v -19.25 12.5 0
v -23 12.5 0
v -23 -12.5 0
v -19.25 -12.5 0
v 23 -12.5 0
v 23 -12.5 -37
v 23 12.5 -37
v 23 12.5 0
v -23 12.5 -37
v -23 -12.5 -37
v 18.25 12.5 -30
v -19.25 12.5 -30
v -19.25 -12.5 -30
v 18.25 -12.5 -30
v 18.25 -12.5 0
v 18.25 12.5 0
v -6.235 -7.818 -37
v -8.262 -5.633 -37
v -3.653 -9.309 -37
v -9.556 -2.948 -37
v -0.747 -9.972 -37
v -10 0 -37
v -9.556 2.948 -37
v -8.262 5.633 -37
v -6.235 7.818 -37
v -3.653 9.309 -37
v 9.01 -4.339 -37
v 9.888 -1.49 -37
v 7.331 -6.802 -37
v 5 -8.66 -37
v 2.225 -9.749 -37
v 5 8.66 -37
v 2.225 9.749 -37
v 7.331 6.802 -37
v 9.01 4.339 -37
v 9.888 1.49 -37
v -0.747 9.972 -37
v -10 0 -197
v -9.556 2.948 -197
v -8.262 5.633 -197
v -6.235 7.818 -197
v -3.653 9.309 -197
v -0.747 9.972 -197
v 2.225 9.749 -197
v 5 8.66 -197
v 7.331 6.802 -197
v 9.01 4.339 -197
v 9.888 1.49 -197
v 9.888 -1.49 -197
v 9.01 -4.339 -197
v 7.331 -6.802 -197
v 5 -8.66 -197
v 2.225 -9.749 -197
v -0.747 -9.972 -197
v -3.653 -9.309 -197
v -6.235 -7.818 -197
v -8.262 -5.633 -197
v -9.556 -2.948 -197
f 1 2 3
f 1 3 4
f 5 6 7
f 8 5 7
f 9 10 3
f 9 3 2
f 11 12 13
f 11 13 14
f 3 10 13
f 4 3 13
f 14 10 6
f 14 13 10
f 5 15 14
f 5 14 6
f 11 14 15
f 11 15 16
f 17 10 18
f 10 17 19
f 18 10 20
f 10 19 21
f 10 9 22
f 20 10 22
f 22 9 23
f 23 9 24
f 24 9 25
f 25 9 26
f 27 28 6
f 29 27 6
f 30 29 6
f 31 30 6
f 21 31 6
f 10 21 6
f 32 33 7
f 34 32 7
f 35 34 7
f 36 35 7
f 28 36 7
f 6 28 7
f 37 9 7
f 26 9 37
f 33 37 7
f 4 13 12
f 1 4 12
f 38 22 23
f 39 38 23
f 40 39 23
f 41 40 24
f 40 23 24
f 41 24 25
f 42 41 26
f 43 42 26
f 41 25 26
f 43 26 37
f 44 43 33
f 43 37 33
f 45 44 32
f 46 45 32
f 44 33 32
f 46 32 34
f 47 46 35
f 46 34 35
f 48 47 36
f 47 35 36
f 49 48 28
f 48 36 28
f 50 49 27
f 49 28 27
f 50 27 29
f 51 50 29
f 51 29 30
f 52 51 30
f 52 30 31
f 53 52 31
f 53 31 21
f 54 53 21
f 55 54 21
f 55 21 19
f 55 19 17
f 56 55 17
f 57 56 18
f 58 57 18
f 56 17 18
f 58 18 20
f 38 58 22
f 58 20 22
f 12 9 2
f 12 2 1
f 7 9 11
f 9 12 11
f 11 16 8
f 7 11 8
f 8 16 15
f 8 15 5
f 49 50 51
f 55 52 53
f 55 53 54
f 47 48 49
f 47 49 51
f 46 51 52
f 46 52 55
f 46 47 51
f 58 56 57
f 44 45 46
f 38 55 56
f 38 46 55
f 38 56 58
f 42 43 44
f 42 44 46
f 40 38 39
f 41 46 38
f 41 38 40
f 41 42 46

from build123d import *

# Parameters (mm, degrees)
SKETCH1_W           = 46
SKETCH1_H           = 25
BOSS_EXTRUDE1_DEPTH = 37
SKETCH2_R           = 10
BOSS_EXTRUDE2_DEPTH = 160
SKETCH3_W           = 37.5
SKETCH3_H           = 36.8
CUT_EXTRUDE1_DEPTH  = 30


with BuildPart() as part:
    # Sketch1 → Boss-Extrude1 (new body)
    with BuildSketch(Plane.XY):
        Rectangle(SKETCH1_W, SKETCH1_H)
    extrude(amount=-BOSS_EXTRUDE1_DEPTH)

    # Sketch2 → Boss-Extrude2 (add)
    with BuildSketch(Plane(origin=(0, 0, -37), x_dir=(-1, 0, 0), z_dir=(0, 0, -1))):
        Circle(SKETCH2_R)
    extrude(amount=BOSS_EXTRUDE2_DEPTH)

    # Sketch3 → Cut-Extrude1 (cut)
    with BuildSketch(Plane.XY):
        with Locations((-0.5, 0)):
            Rectangle(SKETCH3_W, SKETCH3_H)
    extrude(amount=-CUT_EXTRUDE1_DEPTH, mode=Mode.SUBTRACT)


solid = part.part
